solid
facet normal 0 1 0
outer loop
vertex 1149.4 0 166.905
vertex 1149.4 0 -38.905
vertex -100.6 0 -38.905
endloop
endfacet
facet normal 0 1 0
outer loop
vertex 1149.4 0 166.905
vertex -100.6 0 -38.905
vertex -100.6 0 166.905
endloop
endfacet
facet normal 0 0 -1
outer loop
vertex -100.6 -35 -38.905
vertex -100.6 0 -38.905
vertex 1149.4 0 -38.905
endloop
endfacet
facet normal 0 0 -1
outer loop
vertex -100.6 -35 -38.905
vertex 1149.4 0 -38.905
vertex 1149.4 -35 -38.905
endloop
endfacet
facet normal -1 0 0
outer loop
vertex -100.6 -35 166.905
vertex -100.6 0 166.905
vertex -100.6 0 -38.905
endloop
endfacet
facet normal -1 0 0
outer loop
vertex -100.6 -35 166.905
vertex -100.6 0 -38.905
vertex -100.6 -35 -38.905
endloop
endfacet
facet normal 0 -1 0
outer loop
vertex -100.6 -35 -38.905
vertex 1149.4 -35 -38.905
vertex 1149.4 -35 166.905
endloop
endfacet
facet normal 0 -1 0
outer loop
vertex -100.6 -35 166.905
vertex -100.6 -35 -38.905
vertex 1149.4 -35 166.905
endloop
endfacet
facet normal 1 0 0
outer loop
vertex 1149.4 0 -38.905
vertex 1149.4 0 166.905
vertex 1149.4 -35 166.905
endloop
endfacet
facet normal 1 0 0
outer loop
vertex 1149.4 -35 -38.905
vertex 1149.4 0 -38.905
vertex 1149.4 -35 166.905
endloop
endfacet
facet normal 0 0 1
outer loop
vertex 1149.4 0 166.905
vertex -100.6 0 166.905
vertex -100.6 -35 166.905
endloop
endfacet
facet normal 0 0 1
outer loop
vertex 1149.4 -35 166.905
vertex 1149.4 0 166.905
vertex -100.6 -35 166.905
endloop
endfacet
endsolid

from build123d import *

# Parameters (mm, degrees)
F0_W      = 200
F0_H      = 5.810397
F1_DEPTH  = 35
F1_FACE_W = 200
F1_FACE_H = 35
F2_DEPTH  = 200
F2_FACE_W = 35
F2_FACE_H = 205.810398
F3_DEPTH  = 1250


with BuildPart() as f1:
    # F0 (on Front) → F1 (new body)
    with BuildSketch(Plane.XZ):
        with Locations((-0.600006, -36.000002)):
            Rectangle(F0_W, F0_H)
    extrude(amount=F1_DEPTH)

    # F1_face (on face) → F2 (join)
    with BuildSketch(Plane(origin=(-0.600006, -17.5, -33.094804), x_dir=(1, 0, 0), z_dir=(0, 0, 1))):
        Rectangle(F1_FACE_W, F1_FACE_H)
    extrude(amount=F2_DEPTH)

    # F2_face (on face) → F3 (join)
    with BuildSketch(Plane(origin=(-100.600006, -17.5, 63.999998), x_dir=(0, -1, 0), z_dir=(-1, 0, 0))):
        Rectangle(F2_FACE_W, F2_FACE_H)
    extrude(amount=-F3_DEPTH)


solid = f1.part
